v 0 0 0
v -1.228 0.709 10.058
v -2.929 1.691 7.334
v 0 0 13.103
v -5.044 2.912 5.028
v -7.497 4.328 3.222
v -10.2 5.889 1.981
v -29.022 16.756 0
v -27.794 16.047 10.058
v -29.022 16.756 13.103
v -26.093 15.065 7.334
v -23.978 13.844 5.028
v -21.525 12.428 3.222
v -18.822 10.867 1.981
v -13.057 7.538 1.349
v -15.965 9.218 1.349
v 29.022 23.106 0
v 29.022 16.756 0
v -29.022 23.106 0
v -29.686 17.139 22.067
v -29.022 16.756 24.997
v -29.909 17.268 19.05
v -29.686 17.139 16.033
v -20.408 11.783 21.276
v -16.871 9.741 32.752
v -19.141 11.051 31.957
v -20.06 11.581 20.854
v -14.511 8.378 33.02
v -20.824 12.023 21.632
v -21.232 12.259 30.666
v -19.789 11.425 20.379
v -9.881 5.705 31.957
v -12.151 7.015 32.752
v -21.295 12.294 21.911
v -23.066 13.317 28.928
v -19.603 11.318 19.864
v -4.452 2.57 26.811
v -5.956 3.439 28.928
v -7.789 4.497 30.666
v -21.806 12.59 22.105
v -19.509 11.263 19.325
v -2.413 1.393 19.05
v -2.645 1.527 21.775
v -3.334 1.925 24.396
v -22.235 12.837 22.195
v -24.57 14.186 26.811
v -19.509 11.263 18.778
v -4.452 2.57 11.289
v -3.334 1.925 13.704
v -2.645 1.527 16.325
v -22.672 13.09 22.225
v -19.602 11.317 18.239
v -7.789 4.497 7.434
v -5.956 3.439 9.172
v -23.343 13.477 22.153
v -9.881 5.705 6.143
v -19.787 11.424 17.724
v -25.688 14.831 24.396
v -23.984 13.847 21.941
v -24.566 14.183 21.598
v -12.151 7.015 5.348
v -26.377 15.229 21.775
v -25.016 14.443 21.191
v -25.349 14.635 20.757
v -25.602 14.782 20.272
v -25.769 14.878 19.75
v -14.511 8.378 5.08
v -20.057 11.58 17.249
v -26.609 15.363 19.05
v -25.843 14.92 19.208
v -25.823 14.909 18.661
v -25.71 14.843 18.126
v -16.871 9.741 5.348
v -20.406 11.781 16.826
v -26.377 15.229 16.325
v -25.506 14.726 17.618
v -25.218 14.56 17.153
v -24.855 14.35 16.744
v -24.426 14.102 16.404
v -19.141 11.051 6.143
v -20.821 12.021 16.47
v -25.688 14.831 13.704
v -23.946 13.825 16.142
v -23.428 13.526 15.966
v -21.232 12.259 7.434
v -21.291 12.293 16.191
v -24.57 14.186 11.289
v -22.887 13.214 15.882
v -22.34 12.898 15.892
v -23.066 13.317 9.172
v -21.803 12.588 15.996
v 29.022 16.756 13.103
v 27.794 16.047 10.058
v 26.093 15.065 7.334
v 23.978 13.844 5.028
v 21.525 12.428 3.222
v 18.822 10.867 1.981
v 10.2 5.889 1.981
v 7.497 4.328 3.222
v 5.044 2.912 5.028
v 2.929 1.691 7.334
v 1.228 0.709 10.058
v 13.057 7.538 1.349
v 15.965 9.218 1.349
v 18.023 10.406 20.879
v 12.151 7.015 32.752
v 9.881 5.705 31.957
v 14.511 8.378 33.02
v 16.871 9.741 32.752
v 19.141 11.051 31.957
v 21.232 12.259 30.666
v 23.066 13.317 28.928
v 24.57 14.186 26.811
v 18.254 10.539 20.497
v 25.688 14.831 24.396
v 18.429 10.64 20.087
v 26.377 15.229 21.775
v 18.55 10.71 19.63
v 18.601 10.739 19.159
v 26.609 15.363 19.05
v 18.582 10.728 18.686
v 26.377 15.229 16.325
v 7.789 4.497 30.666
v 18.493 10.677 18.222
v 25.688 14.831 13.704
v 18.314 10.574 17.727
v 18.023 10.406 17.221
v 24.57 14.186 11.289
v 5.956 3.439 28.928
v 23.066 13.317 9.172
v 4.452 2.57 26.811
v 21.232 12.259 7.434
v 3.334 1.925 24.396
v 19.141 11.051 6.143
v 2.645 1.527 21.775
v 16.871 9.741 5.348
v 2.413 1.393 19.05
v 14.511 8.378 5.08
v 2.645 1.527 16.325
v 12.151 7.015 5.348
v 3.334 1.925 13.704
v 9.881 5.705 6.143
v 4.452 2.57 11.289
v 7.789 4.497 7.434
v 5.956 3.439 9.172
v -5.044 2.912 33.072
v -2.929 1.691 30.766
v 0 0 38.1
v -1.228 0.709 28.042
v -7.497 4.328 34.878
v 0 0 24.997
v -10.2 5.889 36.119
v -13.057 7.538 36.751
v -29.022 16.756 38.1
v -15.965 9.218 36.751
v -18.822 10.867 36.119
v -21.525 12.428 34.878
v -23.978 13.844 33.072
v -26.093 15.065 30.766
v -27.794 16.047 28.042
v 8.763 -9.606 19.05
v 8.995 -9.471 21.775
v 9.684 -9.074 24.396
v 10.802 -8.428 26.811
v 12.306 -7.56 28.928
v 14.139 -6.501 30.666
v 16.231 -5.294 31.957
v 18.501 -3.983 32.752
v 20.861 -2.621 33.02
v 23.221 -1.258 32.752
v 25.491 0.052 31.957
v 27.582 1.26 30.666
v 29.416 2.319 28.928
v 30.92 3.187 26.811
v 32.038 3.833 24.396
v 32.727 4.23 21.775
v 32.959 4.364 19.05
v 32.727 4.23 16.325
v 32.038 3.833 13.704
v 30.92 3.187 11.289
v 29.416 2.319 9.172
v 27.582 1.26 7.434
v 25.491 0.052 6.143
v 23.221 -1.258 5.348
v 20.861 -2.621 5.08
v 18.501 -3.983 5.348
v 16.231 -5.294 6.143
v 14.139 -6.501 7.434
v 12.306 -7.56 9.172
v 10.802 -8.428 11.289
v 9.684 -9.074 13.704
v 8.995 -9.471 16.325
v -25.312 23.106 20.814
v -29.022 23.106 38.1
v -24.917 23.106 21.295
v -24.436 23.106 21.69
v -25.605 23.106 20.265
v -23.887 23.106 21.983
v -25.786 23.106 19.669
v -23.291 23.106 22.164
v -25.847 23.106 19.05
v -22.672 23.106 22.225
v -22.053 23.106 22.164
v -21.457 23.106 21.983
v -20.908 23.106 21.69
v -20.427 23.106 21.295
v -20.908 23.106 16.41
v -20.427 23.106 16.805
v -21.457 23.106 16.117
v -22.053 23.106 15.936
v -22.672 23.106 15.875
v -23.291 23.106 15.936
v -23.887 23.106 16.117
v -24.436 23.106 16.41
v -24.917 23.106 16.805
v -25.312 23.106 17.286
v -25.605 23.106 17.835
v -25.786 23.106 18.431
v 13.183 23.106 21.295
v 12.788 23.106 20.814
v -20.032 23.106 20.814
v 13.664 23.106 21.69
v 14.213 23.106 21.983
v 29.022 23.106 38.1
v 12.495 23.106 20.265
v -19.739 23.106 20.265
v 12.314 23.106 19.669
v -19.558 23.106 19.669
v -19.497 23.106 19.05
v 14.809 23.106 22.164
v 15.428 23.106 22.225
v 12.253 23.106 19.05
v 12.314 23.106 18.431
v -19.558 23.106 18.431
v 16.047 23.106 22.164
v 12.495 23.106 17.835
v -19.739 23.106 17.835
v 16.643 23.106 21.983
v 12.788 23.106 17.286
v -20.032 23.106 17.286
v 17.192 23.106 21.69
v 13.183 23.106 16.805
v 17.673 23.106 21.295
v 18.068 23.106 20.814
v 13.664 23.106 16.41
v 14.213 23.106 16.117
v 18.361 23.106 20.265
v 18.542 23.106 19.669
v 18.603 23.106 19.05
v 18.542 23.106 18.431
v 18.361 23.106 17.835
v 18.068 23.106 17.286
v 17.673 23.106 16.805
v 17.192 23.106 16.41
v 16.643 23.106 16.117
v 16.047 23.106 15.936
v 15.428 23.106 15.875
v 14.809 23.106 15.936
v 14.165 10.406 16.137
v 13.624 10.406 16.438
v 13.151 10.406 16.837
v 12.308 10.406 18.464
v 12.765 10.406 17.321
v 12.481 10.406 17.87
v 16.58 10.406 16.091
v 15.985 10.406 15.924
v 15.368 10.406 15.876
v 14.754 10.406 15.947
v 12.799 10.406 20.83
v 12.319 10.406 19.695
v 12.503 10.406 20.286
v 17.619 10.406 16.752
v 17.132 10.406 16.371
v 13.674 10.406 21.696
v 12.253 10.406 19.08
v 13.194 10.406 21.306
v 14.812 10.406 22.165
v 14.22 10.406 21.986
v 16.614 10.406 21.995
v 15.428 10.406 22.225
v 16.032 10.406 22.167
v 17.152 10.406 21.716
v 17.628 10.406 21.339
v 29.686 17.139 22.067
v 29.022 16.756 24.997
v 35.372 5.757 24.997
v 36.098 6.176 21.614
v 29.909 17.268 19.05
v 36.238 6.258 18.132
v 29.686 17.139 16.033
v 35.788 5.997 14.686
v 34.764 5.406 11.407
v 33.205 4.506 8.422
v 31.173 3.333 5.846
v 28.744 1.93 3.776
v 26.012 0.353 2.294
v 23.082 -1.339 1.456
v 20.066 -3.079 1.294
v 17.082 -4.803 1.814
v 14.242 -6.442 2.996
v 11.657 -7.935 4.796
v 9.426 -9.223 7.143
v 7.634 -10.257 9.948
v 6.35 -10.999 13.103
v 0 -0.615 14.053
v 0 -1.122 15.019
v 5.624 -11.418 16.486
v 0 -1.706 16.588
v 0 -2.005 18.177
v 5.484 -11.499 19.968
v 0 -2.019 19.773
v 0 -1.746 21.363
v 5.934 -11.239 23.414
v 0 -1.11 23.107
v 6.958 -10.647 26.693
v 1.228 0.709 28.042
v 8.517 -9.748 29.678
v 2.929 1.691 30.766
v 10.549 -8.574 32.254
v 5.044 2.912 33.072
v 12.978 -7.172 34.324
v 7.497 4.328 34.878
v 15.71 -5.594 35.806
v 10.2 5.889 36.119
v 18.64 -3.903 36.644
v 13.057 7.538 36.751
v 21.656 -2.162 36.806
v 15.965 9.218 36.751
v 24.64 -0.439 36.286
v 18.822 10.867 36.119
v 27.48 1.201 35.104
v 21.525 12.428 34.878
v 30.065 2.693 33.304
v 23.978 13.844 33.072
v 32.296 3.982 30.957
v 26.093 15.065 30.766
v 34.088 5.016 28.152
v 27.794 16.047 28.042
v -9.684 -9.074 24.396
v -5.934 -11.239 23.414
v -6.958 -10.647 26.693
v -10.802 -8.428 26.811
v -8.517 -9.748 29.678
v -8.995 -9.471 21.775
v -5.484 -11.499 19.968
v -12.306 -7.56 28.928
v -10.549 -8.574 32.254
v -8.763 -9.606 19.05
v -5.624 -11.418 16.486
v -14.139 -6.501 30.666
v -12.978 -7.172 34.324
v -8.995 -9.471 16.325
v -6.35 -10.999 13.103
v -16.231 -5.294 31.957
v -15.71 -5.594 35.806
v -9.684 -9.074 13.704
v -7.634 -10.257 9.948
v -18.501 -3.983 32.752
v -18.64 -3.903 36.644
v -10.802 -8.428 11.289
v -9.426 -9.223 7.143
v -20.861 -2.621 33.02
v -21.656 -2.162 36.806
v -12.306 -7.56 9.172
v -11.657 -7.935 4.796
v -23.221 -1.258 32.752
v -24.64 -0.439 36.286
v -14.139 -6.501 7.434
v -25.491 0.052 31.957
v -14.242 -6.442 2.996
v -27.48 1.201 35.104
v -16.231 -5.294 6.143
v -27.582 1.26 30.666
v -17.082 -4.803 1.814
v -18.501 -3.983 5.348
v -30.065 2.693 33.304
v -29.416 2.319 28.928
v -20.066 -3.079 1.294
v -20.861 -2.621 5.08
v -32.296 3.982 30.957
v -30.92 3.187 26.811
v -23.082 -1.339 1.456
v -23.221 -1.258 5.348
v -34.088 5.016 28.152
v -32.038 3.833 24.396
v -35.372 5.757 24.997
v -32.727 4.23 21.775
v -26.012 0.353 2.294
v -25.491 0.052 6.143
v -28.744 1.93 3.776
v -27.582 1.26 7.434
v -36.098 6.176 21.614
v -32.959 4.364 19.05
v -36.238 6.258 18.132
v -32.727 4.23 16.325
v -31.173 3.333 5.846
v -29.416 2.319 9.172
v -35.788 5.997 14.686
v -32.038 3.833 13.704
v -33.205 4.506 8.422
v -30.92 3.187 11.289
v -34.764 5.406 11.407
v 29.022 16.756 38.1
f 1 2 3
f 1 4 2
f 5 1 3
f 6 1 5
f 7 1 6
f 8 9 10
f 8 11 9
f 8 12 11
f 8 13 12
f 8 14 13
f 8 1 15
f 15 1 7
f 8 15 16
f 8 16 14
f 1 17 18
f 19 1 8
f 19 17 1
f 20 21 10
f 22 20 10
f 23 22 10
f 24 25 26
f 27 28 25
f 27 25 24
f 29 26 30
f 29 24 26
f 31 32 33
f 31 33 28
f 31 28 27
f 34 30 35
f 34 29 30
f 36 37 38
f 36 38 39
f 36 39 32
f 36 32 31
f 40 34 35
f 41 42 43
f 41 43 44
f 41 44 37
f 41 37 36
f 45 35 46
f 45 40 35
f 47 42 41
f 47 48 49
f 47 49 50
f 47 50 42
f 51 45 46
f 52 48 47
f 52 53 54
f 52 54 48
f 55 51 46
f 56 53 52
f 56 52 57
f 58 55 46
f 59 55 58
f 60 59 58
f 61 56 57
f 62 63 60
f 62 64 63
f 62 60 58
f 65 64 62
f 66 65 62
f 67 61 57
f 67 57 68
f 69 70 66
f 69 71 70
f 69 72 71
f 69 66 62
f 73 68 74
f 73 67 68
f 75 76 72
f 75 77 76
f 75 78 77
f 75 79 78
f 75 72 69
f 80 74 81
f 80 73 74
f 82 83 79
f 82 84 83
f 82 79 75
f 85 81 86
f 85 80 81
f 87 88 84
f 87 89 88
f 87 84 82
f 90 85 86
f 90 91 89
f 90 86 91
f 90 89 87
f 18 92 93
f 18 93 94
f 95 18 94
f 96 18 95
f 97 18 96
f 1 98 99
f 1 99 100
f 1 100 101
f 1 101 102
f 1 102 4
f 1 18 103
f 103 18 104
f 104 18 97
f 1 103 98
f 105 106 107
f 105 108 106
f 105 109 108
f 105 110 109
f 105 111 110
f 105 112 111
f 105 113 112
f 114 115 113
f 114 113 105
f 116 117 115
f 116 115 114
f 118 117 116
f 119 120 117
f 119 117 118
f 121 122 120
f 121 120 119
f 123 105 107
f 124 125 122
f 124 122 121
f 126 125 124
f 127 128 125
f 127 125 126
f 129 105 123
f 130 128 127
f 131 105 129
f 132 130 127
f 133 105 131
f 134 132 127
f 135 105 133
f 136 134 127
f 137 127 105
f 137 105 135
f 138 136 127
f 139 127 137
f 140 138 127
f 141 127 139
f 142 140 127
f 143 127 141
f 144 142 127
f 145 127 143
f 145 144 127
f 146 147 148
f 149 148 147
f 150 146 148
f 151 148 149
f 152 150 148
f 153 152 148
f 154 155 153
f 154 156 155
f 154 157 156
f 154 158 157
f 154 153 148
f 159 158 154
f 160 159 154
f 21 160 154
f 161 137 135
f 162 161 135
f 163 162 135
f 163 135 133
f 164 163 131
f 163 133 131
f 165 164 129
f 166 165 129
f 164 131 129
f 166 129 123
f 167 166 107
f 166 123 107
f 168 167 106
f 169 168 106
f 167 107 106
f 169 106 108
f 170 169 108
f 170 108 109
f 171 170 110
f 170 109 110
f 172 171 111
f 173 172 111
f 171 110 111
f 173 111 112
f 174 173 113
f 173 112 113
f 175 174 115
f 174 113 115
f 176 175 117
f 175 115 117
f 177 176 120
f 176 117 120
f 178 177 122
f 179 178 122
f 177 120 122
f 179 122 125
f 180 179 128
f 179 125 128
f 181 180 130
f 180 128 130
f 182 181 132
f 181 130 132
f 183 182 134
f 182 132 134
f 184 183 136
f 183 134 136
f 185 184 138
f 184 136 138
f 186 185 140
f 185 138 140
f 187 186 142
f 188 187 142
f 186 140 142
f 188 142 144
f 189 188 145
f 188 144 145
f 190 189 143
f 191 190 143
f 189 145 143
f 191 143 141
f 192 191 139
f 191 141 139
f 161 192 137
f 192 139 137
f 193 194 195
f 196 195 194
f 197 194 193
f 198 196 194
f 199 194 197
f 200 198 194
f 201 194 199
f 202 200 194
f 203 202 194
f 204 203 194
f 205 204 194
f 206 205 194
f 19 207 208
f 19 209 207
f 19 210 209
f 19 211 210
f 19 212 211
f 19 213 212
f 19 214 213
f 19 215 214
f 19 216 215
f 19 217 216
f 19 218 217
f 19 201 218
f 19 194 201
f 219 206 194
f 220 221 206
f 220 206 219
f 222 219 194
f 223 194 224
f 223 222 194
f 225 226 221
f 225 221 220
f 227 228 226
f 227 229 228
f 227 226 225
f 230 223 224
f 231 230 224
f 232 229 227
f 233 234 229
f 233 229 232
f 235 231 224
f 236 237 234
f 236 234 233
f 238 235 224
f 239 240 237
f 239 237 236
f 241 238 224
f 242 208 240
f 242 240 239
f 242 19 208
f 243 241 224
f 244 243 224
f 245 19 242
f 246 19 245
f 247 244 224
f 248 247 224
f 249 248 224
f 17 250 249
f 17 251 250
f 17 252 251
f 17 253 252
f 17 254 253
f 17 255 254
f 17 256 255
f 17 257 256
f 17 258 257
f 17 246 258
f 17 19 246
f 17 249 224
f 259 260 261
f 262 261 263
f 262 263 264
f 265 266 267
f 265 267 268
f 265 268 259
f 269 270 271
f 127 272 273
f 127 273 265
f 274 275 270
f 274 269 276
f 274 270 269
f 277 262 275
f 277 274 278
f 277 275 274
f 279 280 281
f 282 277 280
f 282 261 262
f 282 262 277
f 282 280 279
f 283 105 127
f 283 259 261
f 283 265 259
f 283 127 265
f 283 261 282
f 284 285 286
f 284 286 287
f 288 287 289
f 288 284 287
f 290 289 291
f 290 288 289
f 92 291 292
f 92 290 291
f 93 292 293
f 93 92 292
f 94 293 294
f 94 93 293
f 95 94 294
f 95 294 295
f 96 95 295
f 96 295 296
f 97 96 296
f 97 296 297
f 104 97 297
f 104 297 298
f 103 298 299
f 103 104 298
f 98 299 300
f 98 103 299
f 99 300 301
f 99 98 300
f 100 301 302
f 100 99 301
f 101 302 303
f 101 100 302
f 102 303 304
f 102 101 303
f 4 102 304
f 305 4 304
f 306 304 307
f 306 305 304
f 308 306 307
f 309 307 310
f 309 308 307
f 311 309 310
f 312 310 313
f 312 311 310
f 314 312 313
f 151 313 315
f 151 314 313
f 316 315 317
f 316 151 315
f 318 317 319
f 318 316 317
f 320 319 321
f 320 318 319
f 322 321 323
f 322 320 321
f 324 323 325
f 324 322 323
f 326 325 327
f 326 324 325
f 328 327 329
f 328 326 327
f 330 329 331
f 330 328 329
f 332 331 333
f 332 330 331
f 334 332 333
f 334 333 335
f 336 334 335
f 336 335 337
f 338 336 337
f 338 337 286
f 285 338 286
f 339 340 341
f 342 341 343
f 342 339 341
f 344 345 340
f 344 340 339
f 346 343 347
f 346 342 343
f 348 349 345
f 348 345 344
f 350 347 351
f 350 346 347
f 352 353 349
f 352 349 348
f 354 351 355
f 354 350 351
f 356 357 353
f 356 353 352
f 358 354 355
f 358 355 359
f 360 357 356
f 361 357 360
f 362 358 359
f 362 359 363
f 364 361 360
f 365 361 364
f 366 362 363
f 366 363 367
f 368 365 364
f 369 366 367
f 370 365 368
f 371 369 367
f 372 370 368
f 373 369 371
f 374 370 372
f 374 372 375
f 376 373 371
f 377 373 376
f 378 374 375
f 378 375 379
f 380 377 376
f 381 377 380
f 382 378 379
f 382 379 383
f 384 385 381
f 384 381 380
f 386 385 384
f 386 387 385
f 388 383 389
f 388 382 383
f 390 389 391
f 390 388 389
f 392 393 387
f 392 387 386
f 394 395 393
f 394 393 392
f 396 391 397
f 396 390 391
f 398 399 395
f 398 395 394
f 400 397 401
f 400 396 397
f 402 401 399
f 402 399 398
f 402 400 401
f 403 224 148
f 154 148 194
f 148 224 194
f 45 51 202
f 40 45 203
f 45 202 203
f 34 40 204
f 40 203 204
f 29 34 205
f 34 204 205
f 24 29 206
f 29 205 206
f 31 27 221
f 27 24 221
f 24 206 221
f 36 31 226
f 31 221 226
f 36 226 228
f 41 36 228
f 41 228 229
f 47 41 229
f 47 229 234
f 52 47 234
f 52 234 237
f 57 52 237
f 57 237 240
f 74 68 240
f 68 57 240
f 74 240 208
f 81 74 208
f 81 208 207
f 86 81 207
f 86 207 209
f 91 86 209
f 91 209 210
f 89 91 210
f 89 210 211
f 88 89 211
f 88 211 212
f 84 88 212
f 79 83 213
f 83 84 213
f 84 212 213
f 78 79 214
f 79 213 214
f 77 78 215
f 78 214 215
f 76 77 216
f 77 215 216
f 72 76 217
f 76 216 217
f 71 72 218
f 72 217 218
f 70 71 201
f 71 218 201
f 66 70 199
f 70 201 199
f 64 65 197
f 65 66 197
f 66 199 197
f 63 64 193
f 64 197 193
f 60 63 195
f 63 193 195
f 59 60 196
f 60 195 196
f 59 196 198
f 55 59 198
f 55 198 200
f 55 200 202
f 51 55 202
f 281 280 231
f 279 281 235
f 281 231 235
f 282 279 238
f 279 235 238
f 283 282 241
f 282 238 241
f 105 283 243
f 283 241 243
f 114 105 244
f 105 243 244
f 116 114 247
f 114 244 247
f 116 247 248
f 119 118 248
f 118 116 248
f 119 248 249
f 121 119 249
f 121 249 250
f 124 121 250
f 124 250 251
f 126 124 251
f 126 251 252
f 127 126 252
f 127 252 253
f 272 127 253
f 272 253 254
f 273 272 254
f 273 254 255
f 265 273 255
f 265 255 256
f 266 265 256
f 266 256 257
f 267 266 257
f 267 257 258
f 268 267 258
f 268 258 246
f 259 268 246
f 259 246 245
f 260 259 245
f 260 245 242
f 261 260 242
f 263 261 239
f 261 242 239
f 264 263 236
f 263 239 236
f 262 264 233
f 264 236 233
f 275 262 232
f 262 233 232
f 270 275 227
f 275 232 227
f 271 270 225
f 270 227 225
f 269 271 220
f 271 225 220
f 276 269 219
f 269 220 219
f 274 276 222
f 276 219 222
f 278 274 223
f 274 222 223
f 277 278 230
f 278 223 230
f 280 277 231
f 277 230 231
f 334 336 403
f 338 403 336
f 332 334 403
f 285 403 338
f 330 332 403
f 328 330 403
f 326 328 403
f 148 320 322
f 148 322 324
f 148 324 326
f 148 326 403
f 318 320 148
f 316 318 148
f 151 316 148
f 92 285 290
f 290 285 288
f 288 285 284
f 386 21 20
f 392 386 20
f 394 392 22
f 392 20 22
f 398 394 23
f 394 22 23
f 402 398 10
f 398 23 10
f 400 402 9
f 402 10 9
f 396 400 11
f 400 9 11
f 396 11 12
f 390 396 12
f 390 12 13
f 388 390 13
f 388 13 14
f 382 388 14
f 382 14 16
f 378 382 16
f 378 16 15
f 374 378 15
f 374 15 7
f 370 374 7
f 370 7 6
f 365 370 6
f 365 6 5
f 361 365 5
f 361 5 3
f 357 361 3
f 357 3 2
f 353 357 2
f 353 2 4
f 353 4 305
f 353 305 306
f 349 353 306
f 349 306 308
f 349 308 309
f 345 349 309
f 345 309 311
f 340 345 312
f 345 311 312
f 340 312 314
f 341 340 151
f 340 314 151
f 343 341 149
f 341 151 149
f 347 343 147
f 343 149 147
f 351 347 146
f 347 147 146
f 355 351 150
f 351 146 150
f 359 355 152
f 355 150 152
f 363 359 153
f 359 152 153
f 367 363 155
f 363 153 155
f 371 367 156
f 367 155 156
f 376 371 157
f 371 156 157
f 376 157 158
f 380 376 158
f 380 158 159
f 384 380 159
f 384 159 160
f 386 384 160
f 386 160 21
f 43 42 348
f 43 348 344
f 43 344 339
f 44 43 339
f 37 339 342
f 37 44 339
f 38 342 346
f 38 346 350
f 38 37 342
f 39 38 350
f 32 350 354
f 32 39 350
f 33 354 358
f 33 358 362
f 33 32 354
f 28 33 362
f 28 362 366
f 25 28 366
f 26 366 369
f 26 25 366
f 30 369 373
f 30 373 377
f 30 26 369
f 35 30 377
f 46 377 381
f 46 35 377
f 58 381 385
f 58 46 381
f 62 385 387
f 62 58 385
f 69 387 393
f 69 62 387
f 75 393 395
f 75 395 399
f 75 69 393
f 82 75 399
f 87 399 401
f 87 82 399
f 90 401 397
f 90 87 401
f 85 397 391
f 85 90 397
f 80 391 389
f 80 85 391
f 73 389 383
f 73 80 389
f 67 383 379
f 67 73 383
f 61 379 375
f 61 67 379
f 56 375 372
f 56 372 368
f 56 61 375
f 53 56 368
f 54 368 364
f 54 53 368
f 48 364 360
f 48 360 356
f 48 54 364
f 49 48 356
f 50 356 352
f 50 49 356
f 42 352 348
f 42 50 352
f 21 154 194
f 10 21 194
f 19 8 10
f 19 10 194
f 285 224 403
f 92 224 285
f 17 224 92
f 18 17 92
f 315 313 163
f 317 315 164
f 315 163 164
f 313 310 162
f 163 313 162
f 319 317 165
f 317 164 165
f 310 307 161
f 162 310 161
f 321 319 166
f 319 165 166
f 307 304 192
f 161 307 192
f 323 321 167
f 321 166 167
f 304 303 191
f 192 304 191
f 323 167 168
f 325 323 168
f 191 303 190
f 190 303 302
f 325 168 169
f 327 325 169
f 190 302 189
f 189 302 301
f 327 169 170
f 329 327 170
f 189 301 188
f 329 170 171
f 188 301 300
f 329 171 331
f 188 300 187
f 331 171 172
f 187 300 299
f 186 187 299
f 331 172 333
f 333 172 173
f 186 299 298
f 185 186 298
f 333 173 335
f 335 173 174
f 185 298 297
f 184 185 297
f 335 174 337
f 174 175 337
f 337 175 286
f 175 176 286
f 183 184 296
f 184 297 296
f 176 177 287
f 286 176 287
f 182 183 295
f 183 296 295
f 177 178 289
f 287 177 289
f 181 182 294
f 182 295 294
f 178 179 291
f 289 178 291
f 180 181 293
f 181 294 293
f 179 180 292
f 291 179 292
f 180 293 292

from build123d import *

# Parameters (mm, degrees)
BOSS_EXTRUDE1_DEPTH = 38.1
SKETCH4_R           = 17.78
SKETCH4_R_2         = 13.97
BOSS_EXTRUDE3_DEPTH = 12.7
SKETCH5_R           = 3.175
CUT_EXTRUDE2_DEPTH  = 12.7


with BuildPart() as part:
    # Sketch1 → Boss-Extrude1 (new body)
    with BuildSketch(Plane.XY):
        Polygon((-29.021915902, 16.755810958), (-29.021915902, 23.105810958), (29.021915902, 23.105810958), (29.021915902, 16.755810958), (0, 0), align=None)
    extrude(amount=BOSS_EXTRUDE1_DEPTH)

    # Sketch4 → Boss-Extrude3 (add)
    with BuildSketch(Plane(origin=(0, 0, 0), x_dir=(0.8660254037844379, -0.5000000000000012, 0), z_dir=(-0.5000000000000012, -0.8660254037844379, 0))):
        with Locations(Location((-16.755810958, 19.05, 0), (0, 0, 160.458003801))):
            Circle(SKETCH4_R)
        with Locations((-16.755810958, 19.05)):
            Circle(SKETCH4_R_2, mode=Mode.SUBTRACT)
    boss_extrude3 = extrude(amount=BOSS_EXTRUDE3_DEPTH)

    # Mirror2: Boss-Extrude3 across plane
    add(boss_extrude3.mirror(Plane.ZY))

    # Sketch5 → Cut-Extrude2 (cut)
    with BuildSketch(Plane(origin=(0, 23.105810958, 0), x_dir=(1, 0, 0), z_dir=(0, 1, 0))):
        with Locations(Location((-22.671915902, -19.05, 0), (0, 0, 270))):
            Circle(SKETCH5_R)
        with Locations(Location((15.428084098, -19.05, 0), (0, 0, 270))):
            Circle(SKETCH5_R)
    extrude(amount=-CUT_EXTRUDE2_DEPTH, mode=Mode.SUBTRACT)


solid = part.part
